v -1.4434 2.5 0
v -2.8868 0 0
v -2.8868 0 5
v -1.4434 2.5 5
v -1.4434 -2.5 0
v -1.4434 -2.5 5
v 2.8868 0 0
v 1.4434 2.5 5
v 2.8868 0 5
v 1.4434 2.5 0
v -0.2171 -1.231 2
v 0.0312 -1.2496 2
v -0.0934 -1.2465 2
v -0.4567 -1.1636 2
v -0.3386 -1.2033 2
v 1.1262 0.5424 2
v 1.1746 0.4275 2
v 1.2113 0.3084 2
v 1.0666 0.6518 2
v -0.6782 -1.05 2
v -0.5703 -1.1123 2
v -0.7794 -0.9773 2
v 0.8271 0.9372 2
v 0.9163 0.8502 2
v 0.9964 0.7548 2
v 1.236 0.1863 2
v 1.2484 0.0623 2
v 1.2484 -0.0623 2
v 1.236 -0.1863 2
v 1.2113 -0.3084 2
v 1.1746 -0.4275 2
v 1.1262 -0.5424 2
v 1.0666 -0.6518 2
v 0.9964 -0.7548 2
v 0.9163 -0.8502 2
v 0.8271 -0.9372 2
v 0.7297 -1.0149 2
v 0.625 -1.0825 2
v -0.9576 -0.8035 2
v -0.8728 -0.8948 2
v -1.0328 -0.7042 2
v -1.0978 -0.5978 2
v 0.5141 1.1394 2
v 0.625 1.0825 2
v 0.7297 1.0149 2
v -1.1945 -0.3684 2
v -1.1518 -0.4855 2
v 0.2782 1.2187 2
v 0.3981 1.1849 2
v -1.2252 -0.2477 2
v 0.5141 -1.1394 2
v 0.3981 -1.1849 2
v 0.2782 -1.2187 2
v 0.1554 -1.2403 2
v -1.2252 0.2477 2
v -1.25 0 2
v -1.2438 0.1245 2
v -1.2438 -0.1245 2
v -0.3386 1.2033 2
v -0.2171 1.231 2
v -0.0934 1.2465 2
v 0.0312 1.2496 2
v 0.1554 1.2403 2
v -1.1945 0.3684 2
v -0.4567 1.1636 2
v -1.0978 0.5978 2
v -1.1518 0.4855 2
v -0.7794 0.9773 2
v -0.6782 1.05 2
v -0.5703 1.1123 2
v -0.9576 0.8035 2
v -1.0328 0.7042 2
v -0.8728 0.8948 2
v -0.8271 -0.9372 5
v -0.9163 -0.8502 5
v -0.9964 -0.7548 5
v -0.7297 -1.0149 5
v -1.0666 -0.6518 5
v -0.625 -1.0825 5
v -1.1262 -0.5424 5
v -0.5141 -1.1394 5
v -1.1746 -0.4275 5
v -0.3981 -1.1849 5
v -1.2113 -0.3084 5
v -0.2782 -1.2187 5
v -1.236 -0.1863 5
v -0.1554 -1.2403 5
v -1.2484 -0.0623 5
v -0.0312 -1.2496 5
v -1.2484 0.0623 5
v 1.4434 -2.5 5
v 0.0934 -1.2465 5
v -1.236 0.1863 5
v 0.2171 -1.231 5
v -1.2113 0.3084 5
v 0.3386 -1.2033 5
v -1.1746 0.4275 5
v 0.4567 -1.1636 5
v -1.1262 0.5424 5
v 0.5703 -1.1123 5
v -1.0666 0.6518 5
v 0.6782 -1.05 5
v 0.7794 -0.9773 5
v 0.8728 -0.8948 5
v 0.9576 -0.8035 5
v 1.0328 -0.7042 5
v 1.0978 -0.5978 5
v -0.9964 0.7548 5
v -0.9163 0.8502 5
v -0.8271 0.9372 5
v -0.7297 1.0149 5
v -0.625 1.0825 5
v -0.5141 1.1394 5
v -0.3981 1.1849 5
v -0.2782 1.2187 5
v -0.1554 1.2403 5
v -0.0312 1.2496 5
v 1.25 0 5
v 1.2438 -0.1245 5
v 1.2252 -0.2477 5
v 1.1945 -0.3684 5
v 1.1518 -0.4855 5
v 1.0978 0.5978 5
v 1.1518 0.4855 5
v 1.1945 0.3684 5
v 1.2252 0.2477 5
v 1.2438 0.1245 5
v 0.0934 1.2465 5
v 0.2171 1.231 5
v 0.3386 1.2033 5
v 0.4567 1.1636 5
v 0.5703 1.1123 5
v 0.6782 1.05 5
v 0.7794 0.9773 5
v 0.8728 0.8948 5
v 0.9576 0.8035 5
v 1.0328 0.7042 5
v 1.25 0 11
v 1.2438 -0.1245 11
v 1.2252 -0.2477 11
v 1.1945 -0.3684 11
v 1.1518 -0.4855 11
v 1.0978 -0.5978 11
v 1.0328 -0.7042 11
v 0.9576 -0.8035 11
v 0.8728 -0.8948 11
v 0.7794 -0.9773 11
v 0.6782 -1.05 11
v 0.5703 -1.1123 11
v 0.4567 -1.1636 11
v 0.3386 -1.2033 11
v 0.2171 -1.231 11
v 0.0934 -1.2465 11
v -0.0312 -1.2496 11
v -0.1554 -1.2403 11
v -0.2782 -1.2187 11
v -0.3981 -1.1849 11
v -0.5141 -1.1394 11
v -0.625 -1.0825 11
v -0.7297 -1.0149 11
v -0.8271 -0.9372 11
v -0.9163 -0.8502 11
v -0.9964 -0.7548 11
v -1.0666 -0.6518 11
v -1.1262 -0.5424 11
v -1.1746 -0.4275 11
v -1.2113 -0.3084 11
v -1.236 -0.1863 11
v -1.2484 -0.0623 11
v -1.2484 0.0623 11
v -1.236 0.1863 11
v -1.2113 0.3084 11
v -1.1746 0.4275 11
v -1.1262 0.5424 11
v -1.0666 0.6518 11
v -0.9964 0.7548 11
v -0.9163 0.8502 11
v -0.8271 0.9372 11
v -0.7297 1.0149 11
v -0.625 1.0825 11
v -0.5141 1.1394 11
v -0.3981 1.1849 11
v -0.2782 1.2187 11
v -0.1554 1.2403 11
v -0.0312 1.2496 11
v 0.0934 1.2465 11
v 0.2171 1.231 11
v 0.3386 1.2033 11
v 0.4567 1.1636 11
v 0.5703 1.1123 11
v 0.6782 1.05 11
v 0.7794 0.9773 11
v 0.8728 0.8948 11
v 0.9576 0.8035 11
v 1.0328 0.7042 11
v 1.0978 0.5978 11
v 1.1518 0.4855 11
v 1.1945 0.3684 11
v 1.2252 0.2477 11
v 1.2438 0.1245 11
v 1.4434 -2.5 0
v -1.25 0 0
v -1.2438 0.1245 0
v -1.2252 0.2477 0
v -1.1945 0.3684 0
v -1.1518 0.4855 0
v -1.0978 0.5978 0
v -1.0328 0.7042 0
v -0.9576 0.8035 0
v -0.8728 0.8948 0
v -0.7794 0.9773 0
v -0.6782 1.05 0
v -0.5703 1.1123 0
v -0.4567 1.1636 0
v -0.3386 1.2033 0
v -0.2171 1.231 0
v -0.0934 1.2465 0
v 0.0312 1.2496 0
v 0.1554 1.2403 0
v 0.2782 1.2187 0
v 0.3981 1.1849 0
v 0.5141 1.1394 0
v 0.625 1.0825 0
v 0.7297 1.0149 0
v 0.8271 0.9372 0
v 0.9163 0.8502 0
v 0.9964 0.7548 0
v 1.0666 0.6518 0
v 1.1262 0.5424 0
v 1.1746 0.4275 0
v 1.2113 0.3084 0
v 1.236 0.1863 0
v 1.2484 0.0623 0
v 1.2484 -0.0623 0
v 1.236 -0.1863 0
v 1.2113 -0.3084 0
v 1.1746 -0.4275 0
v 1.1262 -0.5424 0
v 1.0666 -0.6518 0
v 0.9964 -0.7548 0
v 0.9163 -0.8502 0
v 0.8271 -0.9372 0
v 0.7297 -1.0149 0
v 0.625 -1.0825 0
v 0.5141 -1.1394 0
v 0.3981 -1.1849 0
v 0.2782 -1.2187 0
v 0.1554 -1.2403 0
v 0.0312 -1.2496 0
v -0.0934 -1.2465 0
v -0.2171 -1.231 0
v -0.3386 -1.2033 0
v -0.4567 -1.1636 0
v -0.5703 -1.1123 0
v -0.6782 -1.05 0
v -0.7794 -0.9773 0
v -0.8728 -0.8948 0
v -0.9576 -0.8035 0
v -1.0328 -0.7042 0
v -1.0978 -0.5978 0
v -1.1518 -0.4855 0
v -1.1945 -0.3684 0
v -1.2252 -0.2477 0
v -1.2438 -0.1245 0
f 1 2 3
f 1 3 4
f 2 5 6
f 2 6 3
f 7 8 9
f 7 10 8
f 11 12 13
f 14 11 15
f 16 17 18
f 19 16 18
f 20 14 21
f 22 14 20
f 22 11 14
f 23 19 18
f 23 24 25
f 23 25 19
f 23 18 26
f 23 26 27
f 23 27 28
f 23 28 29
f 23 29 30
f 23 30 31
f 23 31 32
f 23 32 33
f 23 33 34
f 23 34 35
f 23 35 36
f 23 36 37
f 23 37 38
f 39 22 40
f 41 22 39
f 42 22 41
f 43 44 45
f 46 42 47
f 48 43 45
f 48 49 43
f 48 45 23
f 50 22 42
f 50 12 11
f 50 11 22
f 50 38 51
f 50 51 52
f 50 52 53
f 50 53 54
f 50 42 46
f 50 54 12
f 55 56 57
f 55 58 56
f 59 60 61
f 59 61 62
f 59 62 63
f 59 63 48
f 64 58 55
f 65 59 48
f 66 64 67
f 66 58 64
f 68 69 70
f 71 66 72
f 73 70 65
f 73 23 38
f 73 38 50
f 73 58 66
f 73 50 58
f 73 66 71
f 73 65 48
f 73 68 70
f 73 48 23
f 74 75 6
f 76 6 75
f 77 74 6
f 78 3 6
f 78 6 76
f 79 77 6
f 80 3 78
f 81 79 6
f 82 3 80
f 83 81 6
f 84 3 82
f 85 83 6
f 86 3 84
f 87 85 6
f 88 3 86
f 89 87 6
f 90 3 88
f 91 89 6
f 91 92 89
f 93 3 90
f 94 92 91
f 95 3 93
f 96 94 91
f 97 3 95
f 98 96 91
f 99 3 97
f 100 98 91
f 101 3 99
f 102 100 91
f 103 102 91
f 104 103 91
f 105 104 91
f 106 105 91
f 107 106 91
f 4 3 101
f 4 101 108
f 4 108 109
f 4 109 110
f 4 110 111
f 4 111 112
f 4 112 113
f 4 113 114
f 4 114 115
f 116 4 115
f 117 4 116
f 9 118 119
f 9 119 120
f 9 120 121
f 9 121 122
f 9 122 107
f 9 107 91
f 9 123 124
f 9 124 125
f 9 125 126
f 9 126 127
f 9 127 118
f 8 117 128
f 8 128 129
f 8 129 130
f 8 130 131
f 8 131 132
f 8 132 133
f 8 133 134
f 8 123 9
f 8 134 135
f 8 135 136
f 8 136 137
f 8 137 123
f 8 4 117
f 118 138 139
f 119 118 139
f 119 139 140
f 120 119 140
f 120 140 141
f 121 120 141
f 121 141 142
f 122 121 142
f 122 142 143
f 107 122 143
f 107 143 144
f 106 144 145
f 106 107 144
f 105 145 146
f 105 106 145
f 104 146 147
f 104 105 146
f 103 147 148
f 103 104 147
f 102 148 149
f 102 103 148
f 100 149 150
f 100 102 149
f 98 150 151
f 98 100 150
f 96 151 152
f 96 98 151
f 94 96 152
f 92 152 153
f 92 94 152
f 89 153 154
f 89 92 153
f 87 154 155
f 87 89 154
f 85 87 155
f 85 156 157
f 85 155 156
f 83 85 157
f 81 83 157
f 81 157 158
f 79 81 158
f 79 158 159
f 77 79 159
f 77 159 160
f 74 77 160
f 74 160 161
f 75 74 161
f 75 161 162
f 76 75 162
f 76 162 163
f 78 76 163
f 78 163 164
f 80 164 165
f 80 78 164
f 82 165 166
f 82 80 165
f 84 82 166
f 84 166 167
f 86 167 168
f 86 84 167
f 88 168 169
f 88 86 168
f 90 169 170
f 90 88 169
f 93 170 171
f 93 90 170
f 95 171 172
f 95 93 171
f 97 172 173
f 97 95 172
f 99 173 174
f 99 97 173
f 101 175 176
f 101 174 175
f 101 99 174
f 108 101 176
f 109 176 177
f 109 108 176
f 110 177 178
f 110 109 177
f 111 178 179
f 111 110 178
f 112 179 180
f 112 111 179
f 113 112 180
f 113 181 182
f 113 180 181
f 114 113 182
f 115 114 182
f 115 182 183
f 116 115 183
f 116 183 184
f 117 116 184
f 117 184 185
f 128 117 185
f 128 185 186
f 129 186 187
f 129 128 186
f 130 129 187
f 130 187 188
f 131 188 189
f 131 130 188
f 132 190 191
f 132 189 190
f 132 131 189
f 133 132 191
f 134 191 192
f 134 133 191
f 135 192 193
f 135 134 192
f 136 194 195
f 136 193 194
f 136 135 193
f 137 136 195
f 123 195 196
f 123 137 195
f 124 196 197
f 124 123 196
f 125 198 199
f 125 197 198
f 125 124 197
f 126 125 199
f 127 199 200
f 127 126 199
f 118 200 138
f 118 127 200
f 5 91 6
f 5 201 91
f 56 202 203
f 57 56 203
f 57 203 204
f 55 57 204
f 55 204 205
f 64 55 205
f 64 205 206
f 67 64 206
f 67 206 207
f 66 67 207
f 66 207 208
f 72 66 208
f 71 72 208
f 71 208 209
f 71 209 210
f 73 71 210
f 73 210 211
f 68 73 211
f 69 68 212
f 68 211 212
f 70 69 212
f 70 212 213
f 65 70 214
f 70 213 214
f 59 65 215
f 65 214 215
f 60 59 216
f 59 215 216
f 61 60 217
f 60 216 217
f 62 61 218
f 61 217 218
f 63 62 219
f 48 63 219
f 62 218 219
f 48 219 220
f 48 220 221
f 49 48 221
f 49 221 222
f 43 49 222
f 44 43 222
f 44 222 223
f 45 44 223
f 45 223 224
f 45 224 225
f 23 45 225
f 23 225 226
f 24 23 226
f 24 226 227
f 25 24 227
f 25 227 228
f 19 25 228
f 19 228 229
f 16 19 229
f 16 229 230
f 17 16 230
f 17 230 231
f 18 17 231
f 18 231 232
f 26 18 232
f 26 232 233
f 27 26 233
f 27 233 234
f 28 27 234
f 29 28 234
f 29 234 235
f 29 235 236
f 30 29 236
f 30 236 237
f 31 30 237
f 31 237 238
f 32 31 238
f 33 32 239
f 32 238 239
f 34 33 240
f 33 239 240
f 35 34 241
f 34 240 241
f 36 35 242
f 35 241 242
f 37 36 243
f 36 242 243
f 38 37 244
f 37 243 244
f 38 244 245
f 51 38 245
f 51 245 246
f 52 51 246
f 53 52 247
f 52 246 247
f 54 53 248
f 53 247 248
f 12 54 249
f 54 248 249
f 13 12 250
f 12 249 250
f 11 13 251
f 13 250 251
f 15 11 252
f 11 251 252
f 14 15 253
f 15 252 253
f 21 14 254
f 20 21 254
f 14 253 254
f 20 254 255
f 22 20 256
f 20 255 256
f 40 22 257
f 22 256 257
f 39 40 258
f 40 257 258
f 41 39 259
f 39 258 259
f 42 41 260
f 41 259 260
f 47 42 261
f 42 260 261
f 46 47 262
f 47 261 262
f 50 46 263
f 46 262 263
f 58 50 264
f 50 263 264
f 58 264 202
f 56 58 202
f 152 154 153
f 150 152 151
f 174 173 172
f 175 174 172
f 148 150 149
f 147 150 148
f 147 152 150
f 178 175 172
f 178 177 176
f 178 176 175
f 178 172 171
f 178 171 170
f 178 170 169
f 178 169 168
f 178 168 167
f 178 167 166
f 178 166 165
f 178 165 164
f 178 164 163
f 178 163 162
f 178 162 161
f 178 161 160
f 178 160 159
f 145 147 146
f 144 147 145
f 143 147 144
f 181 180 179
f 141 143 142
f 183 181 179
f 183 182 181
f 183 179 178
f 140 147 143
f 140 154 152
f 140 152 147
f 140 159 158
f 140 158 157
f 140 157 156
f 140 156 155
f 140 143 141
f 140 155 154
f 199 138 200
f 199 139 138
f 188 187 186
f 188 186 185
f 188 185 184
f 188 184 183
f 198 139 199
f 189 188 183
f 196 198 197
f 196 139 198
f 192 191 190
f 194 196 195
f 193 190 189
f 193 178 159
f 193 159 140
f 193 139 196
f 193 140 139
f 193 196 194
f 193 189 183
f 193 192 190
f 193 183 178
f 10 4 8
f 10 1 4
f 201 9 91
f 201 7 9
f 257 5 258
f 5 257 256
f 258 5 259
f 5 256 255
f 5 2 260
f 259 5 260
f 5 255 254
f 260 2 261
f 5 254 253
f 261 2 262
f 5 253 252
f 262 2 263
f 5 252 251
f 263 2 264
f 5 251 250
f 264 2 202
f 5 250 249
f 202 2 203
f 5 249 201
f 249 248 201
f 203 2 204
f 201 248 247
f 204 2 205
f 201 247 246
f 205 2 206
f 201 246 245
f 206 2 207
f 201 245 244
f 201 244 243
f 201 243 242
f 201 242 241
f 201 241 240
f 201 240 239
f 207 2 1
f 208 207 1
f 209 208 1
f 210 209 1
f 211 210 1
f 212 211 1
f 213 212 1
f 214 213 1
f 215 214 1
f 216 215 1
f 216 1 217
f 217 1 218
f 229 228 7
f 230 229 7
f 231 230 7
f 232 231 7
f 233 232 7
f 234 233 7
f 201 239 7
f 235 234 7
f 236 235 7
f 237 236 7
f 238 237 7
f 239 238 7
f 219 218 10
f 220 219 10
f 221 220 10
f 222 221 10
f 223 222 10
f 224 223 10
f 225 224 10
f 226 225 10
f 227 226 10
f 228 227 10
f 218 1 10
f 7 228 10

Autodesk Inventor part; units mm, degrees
ref_plane "YZ Plane" through (0, 0, 0) normal (1, 0, 0) x (0, 1, 0)
ref_plane "XZ Plane" through (0, 0, 0) normal (0, 1, 0) x (-1, 0, 0)
ref_plane "XY Plane" through (0, 0, 0) normal (0, 0, 1) x (1, 0, 0)
sketch "Sketch1" plane through (0, 0, 0) normal (0, 0, 1) x (1, 0, 0)
  line L0 (2.8868, 0) -> (1.4434, -2.5)
  line L1 (1.4434, -2.5) -> (-1.4434, -2.5)
  line L2 (-1.4434, -2.5) -> (-2.8868, 0)
  line L3 (-2.8868, 0) -> (-1.4434, 2.5)
  line L4 (-1.4434, 2.5) -> (1.4434, 2.5)
  line L5 (1.4434, 2.5) -> (2.8868, 0)
  point P0 (0, 0)
  point P1 (0, 0)
  dimension "d0" = 5
extrude "Extrusion1" add sketch "Sketch1" along normal blind 5
sketch "Sketch3" plane through (0, 0, 0) normal (0, 0, -1) x (-1, 0, 0)
  circle A0 centre (0, 0) radius 1.25
  dimension "d6" = 2.5
extrude "Extrusion3" cut sketch "Sketch3" against normal through all
sketch "Sketch4" plane through (0, 0, 5) normal (0, 0, 1) x (1, 0, 0)
  circle A0 centre (0, 0) radius 1.25
  dimension "d9" = 2.5
extrude "Extrusion4" add sketch "Sketch4" along normal blind 6
sketch "Sketch5" plane through (0, 0, 5) normal (0, 0, -1) x (-1, 0, 0)
  circle A0 centre (0, 0) radius 1.25 projected
extrude "Extrusion5" add sketch "Sketch5" along normal blind 3
properties part number "M2.5x6mm_Standoff_ 971050154"
